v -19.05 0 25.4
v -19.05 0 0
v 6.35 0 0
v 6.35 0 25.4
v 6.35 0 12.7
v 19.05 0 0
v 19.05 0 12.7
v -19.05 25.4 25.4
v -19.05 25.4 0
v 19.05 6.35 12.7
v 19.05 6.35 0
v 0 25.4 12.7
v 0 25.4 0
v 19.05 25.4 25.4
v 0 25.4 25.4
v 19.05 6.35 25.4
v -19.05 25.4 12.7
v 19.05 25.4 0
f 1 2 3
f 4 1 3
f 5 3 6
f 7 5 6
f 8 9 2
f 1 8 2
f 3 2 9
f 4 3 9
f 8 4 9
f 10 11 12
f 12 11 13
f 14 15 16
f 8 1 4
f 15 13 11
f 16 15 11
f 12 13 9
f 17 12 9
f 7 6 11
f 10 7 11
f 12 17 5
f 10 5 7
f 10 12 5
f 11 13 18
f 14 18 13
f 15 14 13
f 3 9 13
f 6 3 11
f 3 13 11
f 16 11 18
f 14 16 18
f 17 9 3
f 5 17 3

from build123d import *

# Parameters (mm, degrees)
F1_DEPTH = 25.4
F2_DEPTH = 12.7


with BuildPart() as f1:
    # F0 (on Top) → F1 (new body)
    with BuildSketch(Plane.XY):
        Polygon((6.35, 0), (-19.05, 25.4), (-19.05, 0), align=None)
    extrude(amount=F1_DEPTH)


with BuildPart() as f1b:
    # F0 (on Top) → F1, piece 2 (new body)
    with BuildSketch(Plane.XY):
        Polygon((19.05, 25.4), (0, 25.4), (19.05, 6.35), align=None)
    extrude(amount=F1_DEPTH)


with BuildPart() as f2:
    # F0 (on Top) → F2 (new body)
    with BuildSketch(Plane.XY):
        Polygon((0, 25.4), (-19.05, 25.4), (6.35, 0), (19.05, 0), (19.05, 6.35), align=None)
    extrude(amount=F2_DEPTH)


solid = Compound([f1.part, f1b.part, f2.part])
